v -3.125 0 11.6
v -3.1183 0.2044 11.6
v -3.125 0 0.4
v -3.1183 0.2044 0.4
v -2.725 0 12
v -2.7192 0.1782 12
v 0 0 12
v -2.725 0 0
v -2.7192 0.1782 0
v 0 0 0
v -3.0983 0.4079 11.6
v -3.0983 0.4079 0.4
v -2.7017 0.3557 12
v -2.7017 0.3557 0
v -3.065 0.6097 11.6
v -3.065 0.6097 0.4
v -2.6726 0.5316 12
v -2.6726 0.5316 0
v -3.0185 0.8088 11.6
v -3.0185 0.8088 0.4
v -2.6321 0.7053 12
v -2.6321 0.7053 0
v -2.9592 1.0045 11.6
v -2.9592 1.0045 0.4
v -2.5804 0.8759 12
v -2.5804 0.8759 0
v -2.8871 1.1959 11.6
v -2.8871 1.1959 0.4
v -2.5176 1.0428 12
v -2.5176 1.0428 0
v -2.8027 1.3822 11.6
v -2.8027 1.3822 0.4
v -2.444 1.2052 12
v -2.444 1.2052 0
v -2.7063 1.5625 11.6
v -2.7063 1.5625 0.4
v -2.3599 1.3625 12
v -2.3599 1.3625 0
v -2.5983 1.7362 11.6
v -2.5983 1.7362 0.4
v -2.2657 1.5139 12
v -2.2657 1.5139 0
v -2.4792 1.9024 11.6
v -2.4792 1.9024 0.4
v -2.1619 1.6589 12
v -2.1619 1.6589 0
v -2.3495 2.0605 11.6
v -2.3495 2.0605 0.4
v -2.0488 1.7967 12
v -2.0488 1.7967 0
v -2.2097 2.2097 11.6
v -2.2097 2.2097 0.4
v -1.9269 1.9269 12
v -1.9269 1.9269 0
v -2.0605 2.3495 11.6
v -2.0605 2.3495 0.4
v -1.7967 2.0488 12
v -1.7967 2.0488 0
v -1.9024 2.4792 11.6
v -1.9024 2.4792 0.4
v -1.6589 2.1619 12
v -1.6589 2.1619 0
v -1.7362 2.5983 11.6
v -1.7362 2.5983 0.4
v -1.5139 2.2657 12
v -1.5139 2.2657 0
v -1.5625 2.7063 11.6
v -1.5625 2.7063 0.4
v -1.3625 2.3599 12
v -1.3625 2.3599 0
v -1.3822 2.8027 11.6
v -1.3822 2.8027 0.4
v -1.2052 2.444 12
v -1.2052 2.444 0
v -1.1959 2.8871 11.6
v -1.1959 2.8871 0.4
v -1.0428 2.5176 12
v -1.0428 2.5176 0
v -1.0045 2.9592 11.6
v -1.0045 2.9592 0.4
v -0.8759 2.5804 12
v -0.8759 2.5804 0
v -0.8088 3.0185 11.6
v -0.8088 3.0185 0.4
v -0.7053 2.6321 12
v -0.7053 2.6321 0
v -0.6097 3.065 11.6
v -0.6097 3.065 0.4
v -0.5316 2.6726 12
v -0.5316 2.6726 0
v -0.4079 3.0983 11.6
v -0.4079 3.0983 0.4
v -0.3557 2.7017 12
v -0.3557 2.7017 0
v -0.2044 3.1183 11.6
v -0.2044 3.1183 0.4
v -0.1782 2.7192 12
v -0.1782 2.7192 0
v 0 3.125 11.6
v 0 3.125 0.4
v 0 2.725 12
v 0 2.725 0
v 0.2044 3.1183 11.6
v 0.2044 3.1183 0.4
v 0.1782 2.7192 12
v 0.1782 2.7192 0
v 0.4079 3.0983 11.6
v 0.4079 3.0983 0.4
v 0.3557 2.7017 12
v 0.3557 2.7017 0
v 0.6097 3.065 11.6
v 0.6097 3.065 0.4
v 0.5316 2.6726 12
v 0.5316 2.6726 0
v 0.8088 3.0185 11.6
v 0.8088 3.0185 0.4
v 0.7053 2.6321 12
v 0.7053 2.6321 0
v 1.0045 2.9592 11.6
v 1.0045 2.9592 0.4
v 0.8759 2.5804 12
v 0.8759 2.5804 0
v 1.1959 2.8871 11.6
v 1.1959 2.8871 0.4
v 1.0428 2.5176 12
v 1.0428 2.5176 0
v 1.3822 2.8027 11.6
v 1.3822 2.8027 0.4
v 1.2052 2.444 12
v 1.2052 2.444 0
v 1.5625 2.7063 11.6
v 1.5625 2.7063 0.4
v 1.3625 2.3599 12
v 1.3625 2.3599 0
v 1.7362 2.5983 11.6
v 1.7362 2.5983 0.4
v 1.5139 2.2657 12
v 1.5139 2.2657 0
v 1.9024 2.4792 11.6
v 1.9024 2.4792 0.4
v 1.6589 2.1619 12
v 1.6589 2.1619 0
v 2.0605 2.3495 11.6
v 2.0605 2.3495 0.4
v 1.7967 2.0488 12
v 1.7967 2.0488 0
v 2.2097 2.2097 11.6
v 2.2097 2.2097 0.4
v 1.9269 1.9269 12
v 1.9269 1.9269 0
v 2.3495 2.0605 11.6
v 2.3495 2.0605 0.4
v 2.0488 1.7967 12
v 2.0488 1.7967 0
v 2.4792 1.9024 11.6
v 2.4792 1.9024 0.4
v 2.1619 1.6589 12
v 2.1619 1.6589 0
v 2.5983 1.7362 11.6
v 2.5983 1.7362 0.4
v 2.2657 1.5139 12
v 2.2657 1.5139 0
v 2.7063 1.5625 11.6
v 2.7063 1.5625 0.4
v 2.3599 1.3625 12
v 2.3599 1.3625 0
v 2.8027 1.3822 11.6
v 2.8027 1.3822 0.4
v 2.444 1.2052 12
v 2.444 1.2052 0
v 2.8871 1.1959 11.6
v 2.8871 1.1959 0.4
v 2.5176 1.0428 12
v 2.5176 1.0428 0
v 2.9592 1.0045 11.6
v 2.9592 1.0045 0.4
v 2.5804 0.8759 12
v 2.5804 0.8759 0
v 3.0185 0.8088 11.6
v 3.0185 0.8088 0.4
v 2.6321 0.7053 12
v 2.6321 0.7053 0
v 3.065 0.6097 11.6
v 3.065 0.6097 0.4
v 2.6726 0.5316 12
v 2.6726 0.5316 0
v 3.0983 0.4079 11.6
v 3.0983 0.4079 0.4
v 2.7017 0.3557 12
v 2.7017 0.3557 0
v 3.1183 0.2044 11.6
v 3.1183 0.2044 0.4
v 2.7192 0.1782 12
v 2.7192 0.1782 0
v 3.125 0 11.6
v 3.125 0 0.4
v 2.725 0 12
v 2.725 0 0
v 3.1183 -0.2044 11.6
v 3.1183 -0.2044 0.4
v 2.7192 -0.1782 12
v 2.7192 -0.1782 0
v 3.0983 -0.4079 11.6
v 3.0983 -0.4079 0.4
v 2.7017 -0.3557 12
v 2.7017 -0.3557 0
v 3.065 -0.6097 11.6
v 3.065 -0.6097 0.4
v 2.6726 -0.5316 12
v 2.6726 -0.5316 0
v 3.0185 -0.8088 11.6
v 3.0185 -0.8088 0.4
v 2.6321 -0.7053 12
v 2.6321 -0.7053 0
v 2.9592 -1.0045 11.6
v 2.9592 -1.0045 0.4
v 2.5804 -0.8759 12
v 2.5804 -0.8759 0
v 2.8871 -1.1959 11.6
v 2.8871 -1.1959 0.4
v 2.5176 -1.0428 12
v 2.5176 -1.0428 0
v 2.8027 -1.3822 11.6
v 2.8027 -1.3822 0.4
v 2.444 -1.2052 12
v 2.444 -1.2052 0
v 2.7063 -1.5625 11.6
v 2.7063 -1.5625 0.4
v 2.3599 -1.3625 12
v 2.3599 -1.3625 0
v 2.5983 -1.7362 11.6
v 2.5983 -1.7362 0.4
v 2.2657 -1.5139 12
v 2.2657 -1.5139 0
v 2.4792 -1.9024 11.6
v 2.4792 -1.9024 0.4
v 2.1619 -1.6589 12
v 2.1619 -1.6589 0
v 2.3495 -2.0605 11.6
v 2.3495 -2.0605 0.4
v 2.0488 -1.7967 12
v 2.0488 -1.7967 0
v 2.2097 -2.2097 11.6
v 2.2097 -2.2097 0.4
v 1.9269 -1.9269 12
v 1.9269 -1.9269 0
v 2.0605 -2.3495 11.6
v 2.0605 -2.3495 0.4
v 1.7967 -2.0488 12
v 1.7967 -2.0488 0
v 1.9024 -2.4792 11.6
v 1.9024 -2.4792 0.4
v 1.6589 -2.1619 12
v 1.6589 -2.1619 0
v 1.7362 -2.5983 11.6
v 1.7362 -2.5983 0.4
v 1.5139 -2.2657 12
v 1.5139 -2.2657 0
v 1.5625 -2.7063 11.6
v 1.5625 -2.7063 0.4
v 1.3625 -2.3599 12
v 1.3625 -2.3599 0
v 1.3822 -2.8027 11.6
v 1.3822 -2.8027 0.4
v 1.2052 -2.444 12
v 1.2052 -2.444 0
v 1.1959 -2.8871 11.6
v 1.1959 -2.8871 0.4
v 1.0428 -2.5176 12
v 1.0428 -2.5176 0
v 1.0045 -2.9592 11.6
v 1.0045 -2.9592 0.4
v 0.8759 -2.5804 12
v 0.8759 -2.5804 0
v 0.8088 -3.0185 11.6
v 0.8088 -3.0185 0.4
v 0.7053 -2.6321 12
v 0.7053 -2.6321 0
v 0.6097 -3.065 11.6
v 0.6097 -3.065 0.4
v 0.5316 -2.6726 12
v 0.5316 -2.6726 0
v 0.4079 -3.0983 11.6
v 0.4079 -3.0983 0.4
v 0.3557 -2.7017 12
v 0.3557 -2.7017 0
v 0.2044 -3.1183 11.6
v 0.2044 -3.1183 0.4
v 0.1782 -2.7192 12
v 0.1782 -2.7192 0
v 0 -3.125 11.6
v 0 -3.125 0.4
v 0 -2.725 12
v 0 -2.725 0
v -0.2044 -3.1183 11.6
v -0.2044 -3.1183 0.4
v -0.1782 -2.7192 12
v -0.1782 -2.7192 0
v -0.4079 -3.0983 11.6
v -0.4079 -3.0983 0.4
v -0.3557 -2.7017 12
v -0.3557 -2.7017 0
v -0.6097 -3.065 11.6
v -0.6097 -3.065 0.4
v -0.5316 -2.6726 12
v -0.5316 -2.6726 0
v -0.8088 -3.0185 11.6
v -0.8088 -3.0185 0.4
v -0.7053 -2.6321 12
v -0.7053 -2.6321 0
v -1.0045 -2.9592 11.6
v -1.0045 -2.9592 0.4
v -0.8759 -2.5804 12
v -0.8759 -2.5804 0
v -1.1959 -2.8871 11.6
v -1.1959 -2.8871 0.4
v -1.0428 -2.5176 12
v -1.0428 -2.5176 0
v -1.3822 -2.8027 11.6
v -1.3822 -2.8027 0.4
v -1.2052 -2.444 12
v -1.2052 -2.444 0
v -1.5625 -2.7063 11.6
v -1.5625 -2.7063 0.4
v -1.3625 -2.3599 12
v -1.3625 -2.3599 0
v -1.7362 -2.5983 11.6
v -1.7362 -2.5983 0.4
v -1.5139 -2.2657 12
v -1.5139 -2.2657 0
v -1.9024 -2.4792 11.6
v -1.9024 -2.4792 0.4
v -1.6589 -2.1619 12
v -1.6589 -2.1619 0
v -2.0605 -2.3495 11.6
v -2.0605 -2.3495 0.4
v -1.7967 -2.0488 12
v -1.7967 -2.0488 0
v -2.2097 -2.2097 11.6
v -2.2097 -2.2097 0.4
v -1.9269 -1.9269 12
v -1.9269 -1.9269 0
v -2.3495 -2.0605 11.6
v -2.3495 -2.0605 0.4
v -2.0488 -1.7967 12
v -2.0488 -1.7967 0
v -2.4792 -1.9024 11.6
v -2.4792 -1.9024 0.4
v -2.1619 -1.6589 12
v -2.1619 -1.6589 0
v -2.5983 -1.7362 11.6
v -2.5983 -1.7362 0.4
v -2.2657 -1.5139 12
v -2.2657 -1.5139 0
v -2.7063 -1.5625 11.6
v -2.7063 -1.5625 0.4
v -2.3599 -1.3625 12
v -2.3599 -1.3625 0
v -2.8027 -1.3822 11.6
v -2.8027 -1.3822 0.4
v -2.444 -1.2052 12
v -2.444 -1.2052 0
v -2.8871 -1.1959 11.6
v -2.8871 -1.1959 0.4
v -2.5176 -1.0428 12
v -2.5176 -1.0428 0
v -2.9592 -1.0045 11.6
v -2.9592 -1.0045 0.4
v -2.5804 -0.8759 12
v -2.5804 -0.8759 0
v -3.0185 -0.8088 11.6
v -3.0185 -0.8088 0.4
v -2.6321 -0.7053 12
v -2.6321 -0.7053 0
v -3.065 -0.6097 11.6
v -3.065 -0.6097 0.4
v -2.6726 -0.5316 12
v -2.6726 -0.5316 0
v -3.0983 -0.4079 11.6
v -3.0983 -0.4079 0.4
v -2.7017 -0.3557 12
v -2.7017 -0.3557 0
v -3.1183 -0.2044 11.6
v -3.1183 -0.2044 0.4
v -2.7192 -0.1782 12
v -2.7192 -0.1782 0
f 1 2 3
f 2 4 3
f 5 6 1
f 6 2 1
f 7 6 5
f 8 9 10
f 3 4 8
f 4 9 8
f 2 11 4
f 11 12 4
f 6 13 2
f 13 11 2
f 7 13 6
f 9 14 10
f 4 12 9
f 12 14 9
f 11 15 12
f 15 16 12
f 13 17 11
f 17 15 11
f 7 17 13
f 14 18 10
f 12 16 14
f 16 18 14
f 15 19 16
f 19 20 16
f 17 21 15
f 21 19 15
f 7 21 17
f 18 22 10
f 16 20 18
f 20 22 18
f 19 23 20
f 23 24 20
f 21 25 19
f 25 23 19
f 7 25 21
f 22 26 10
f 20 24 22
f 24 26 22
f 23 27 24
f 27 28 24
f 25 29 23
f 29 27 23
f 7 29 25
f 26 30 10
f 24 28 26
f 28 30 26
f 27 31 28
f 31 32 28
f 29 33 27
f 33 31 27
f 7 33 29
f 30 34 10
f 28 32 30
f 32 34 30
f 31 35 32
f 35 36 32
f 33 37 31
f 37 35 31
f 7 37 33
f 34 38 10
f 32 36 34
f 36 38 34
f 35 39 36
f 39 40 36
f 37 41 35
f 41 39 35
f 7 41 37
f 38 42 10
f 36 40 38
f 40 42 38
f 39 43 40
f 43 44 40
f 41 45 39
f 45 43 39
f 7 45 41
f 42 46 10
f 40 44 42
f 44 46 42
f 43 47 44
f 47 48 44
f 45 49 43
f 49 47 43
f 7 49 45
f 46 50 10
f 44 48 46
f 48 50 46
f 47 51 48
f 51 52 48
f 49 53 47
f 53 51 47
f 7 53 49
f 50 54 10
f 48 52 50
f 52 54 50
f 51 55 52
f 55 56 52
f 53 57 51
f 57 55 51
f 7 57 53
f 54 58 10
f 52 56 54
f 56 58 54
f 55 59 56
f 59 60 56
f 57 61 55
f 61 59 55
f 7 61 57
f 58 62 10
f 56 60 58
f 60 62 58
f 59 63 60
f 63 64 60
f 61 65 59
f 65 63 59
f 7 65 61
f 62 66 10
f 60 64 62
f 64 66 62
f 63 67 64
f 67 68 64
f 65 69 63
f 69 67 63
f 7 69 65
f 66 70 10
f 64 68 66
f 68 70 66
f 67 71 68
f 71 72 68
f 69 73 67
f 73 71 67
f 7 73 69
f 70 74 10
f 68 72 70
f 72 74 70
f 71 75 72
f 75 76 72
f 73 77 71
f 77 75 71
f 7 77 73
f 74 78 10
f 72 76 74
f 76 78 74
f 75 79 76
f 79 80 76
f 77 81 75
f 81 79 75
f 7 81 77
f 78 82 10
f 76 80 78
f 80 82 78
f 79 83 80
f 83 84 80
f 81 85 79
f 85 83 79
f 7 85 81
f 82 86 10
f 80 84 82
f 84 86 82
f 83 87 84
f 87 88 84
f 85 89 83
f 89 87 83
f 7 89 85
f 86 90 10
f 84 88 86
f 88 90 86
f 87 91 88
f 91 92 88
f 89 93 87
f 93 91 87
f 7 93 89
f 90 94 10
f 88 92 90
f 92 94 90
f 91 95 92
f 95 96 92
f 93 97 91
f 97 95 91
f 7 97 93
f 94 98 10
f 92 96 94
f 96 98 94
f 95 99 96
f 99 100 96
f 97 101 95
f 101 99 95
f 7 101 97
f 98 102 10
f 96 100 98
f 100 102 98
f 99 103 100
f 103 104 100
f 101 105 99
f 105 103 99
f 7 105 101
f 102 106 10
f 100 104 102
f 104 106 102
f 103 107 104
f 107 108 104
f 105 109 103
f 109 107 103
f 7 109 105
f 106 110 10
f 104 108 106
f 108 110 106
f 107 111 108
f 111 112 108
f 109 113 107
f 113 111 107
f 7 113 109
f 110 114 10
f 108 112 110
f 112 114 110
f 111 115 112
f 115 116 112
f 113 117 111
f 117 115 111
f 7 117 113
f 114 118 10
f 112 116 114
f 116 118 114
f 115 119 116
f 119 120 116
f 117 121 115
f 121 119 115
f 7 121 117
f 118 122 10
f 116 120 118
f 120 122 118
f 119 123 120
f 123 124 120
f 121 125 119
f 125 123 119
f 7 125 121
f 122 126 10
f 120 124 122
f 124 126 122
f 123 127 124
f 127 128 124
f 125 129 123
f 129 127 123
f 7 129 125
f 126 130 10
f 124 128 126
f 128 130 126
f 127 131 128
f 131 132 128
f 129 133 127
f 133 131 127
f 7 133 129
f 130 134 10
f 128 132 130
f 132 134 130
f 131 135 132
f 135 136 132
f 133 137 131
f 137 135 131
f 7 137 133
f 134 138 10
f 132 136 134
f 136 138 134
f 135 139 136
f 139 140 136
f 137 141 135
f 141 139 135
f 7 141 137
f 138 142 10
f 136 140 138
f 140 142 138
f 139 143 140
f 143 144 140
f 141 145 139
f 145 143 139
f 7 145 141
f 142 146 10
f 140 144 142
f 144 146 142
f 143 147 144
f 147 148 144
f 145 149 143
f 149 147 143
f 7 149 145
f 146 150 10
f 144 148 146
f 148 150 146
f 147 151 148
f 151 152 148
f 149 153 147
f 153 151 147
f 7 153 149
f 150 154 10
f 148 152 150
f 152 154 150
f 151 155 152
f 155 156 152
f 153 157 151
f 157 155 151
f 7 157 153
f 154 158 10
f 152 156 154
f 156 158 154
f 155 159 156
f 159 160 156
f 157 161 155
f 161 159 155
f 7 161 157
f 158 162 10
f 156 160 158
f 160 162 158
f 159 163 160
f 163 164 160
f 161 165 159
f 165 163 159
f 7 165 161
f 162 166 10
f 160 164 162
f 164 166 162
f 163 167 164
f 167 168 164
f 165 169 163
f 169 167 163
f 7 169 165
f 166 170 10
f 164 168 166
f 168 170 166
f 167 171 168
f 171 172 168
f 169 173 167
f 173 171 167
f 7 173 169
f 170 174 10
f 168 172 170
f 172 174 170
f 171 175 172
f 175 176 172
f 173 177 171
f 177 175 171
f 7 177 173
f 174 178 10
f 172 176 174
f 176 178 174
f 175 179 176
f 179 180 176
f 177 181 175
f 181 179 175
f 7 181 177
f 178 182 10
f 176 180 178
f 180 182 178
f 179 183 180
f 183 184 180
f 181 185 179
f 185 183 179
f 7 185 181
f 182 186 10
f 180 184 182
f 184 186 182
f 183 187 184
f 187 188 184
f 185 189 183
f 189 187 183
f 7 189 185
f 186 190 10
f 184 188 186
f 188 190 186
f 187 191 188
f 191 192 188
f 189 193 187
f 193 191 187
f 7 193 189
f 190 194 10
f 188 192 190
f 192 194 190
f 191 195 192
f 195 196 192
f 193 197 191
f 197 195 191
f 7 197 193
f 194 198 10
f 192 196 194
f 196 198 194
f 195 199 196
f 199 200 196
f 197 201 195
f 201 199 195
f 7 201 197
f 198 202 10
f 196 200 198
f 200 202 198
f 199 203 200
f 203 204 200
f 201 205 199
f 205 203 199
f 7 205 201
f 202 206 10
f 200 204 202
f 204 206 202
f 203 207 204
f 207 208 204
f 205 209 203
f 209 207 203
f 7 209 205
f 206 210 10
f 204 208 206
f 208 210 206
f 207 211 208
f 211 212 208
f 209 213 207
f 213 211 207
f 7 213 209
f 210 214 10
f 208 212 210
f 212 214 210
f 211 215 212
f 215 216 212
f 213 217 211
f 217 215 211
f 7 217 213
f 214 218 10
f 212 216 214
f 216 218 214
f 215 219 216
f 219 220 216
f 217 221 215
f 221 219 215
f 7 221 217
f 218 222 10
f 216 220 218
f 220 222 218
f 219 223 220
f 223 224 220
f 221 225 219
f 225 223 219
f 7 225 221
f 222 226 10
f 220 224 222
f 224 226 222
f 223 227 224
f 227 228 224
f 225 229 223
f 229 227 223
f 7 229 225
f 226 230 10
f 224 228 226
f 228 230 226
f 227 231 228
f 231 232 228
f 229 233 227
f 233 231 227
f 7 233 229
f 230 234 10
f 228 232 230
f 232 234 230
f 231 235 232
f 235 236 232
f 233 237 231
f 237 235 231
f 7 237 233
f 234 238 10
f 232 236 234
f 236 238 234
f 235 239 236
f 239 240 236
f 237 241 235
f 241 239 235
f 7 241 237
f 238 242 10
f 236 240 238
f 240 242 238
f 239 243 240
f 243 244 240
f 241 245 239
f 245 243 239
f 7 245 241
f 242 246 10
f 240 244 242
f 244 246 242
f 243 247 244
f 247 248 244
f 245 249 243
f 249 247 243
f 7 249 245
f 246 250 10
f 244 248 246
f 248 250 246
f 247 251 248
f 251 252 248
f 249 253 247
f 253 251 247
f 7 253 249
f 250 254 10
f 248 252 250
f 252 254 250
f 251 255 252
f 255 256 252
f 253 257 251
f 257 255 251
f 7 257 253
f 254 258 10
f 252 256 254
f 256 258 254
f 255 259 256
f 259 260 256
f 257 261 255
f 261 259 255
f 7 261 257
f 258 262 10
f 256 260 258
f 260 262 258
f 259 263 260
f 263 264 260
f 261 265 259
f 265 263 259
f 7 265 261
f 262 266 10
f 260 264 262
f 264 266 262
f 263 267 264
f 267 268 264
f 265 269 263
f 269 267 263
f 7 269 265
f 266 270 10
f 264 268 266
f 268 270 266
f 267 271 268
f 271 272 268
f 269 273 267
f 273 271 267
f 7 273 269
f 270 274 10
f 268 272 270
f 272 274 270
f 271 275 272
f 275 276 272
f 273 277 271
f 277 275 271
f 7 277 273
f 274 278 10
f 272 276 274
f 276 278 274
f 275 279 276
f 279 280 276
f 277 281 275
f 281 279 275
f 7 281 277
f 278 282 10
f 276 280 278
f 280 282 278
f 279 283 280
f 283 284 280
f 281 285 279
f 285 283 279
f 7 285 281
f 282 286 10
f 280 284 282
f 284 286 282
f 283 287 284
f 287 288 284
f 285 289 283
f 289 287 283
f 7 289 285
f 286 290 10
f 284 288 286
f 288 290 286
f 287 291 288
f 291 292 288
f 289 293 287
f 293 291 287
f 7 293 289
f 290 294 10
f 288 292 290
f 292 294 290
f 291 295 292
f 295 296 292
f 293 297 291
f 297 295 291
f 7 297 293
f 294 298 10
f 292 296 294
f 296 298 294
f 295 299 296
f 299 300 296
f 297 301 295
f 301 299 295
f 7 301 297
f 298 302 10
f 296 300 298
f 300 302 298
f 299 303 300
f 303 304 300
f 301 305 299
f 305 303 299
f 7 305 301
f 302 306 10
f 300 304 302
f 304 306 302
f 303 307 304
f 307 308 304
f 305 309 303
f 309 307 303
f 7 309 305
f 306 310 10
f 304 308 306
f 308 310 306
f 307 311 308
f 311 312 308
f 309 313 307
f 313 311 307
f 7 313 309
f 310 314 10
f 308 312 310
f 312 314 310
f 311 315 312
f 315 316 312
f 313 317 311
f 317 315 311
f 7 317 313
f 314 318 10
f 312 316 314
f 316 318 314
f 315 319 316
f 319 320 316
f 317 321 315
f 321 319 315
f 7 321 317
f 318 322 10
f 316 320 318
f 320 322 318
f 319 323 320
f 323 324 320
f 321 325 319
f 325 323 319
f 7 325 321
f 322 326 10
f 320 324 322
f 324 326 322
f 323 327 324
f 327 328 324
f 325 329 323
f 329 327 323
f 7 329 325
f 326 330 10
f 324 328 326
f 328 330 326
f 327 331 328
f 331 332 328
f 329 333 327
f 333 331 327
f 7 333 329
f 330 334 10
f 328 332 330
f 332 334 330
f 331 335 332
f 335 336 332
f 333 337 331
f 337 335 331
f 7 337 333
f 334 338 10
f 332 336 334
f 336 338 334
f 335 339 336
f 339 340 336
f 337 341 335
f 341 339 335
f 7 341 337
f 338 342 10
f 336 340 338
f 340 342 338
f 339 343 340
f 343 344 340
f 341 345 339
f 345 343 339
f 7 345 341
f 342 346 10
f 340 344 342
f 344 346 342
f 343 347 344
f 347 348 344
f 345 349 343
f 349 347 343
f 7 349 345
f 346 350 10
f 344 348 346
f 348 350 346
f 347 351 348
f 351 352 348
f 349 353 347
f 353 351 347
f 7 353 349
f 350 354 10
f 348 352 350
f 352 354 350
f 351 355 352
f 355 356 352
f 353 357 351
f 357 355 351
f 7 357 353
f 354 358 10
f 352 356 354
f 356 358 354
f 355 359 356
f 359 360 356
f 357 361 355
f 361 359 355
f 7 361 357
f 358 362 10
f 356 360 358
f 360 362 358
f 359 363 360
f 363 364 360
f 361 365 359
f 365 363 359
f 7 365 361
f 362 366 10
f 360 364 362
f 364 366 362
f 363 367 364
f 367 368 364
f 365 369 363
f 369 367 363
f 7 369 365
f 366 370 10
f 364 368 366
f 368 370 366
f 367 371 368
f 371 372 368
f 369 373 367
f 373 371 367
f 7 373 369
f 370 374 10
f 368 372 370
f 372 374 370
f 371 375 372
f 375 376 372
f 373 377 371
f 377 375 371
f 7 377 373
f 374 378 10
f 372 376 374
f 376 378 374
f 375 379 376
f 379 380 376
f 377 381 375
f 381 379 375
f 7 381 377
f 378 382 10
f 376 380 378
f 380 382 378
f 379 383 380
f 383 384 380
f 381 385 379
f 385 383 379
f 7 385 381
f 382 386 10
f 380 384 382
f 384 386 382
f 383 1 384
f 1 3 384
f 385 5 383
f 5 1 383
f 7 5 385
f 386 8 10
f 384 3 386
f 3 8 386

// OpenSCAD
// file: ../lib/project/bic_eraser_plug.scad
// Reusable geometry for Bic mechanical pencil eraser replacement plugs.
// Z origin is at the bottom of the insert; +Z points toward the eraser cap.

module bic_eraser_plug(
  insert_diameter,
  insert_height,
  head_diameter = 0,
  head_height = 0,
  bottom_chamfer = 0.4,
  top_chamfer = 0.4
) {
  effective_head_diameter = head_diameter > 0 ? head_diameter : insert_diameter;
  effective_head_height = head_height > 0 ? head_height : 0;
  body_height = insert_height - effective_head_height;
  insert_radius = insert_diameter / 2;
  head_radius = effective_head_diameter / 2;
  bottom_chamfer_radius = min(bottom_chamfer, insert_radius, insert_height / 2);
  top_chamfer_radius = min(top_chamfer, head_radius, insert_height / 2);
  body_top_z = effective_head_height > 0 ? body_height : insert_height;
  top_start_z = insert_height - top_chamfer_radius;

  if (body_height <= 0) {
    assert(false, "insert_height must be larger than head_height");
  }

  rotate_extrude()
    polygon(concat(
      [[0, 0]],
      bottom_chamfer_radius > 0
        ? [[insert_radius - bottom_chamfer_radius, 0], [insert_radius, bottom_chamfer_radius]]
        : [[insert_radius, 0]],
      [[insert_radius, body_top_z]],
      effective_head_height > 0 && effective_head_diameter != insert_diameter
        ? [[head_radius, body_top_z]]
        : [],
      top_chamfer_radius > 0
        ? [[head_radius, top_start_z], [head_radius - top_chamfer_radius, insert_height]]
        : [[head_radius, insert_height]],
      [[0, insert_height]]
    ));
}
// main file
// Simple cylindrical plug for a Bic mechanical pencil eraser opening.

use <../lib/project/bic_eraser_plug.scad>;

// ---------- Public parameters (mm) ----------
insert_diameter = 6.25;  // Measured diameter minus 0.15 mm for fit tuning.
insert_height = 12.0;    // Total height using the measured insert plus head heights.
$fn = 96;

bic_eraser_plug(
  insert_diameter = insert_diameter,
  insert_height = insert_height
);
